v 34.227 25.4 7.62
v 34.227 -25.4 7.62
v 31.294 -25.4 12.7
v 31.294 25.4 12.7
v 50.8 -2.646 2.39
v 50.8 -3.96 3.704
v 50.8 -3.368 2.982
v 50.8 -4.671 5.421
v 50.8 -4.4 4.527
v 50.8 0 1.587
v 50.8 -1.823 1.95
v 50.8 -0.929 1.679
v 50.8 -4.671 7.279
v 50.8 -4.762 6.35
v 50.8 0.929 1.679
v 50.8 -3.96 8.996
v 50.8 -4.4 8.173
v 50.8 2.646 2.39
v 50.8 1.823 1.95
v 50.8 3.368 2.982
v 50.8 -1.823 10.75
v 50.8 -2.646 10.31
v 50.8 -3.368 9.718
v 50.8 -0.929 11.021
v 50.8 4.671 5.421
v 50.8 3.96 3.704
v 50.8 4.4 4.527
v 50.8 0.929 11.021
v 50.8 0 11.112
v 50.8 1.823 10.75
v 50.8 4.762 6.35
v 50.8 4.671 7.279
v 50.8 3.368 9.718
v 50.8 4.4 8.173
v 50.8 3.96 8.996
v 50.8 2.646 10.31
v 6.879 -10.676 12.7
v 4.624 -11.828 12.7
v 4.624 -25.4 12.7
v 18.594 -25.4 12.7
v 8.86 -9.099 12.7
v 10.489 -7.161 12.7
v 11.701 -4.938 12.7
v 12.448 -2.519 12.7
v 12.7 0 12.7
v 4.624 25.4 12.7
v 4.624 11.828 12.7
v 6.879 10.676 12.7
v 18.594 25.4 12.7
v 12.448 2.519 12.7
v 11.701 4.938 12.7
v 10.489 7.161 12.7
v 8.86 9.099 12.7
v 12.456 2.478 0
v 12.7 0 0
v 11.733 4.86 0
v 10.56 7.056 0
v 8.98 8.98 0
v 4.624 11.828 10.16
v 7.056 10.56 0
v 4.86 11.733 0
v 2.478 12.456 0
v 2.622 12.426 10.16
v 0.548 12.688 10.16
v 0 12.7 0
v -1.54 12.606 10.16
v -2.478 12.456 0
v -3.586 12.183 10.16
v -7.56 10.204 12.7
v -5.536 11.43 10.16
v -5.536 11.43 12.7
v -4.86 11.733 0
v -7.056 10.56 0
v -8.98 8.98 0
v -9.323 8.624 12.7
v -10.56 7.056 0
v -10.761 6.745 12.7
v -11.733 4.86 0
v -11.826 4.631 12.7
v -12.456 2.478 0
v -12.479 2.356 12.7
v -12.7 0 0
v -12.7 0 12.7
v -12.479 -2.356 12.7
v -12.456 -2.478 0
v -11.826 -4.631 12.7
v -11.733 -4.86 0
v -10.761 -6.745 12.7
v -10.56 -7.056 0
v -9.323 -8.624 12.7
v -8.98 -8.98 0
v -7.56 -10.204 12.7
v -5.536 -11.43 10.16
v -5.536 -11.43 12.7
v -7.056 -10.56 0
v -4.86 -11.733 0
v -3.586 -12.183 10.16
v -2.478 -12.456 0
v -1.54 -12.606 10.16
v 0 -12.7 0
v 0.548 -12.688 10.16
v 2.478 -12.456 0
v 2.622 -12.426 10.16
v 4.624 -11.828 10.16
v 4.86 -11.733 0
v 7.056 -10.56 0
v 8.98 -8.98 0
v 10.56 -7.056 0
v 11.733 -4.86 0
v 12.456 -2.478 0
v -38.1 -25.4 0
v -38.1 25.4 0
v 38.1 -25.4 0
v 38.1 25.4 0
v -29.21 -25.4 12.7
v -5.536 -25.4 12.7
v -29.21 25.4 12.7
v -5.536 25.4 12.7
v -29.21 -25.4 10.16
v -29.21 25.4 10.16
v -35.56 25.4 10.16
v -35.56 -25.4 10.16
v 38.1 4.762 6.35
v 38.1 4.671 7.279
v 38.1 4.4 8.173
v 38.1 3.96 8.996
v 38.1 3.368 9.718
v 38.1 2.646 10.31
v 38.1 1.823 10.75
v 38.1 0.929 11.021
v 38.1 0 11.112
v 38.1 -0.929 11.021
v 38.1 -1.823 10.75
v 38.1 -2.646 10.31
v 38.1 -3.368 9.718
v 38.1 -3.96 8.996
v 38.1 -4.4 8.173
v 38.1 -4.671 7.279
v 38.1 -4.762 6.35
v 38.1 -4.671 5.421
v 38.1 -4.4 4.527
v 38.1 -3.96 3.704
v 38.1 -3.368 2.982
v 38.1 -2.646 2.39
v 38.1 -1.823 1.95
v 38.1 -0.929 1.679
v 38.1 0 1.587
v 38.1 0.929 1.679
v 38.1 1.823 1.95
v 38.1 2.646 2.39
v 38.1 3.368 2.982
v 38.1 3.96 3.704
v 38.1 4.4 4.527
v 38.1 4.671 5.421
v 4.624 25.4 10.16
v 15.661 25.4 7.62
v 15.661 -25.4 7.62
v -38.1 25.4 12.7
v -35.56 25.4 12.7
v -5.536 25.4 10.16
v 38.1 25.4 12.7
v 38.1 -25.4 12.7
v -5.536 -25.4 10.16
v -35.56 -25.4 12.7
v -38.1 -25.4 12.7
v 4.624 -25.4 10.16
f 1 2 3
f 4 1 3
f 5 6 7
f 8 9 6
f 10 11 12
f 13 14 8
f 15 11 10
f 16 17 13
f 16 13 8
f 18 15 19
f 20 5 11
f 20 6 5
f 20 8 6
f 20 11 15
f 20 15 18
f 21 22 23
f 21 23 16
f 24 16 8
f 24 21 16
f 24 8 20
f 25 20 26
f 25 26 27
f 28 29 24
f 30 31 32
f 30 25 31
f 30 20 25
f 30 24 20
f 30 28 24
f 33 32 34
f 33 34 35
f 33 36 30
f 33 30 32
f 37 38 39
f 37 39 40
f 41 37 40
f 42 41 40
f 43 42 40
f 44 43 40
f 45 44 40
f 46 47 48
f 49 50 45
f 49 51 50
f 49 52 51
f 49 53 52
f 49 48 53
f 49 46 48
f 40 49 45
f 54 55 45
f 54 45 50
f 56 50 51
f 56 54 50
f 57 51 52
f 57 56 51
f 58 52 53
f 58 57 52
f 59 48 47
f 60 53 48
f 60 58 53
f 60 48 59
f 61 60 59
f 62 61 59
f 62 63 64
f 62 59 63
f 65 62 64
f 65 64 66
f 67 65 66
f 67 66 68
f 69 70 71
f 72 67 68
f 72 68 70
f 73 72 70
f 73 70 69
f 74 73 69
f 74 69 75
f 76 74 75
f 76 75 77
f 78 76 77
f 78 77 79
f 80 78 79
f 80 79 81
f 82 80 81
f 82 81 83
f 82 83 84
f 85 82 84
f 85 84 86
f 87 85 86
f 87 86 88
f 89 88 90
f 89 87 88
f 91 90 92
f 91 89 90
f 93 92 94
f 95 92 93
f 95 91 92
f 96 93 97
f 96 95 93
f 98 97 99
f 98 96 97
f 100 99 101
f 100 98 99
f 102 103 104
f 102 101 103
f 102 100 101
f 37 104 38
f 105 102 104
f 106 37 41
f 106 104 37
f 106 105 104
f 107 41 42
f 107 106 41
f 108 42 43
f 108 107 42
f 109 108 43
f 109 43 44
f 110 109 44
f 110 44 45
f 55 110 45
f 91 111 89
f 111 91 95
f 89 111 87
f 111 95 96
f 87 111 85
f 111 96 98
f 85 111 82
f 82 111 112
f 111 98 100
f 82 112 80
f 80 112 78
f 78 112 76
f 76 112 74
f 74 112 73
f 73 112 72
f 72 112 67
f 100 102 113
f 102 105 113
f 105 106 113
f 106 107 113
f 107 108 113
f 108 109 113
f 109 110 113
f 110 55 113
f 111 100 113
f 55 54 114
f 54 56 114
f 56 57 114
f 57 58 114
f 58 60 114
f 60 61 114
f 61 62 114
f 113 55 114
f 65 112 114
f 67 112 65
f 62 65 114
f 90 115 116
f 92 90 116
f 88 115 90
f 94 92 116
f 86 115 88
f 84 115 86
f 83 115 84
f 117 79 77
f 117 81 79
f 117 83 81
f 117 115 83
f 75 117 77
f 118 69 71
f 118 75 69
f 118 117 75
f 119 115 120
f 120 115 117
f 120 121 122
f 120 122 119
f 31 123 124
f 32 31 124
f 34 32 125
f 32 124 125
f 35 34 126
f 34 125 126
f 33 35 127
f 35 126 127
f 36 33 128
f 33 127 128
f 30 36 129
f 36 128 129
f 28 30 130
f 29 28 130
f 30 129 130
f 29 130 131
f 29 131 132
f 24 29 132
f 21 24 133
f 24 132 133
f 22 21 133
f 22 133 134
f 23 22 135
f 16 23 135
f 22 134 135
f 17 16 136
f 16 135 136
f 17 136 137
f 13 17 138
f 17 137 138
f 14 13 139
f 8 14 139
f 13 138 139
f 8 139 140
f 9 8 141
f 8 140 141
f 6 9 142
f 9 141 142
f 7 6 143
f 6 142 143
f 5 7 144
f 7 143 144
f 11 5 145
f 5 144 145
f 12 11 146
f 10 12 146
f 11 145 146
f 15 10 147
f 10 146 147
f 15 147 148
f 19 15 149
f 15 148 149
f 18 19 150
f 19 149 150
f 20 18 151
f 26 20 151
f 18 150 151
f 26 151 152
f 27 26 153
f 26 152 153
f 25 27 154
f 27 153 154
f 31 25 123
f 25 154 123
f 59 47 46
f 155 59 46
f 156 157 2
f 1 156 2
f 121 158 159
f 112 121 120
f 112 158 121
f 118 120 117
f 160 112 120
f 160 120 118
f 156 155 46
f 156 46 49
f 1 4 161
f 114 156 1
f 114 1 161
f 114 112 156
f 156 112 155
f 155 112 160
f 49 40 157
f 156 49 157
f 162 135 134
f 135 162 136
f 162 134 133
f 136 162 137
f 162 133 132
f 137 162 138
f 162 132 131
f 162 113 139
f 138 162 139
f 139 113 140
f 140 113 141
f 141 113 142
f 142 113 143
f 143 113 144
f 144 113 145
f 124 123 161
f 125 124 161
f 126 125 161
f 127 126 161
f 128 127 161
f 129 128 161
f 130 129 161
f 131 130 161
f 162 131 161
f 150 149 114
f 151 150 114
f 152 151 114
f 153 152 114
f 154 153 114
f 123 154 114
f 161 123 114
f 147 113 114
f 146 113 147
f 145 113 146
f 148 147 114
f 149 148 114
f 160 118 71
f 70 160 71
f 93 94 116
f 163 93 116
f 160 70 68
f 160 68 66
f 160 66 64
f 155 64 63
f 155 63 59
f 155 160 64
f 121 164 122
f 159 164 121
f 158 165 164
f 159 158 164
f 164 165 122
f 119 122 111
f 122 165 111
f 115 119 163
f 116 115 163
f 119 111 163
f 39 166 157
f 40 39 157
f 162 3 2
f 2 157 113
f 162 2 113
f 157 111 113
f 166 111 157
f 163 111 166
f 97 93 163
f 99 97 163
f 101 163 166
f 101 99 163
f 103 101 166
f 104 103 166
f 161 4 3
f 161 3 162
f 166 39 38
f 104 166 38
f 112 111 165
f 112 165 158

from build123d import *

# Parameters (mm, degrees)
F0_W     = 76.2
F0_H     = 50.8
F0_R     = 12.7
F1_DEPTH = 12.7
F2_W     = 6.35
F2_H     = 50.8
F3_DEPTH = 2.54
F5_DEPTH = 50.801
F6_R     = 4.7625
F7_DEPTH = 12.7


with BuildPart() as f1:
    # F0 (on Top) → F1 (new body)
    with BuildSketch(Plane.XY):
        Rectangle(F0_W, F0_H)
        Circle(F0_R, mode=Mode.SUBTRACT)
    extrude(amount=F1_DEPTH)

    # F2 (on face) → F3 (cut)
    with BuildSketch(Plane.XY.offset(12.7)):
        with BuildLine():
            ThreePointArc((4.624233052, 11.8282064862), (-0.4973552707, 12.6902575913), (-5.535766948, 11.4300168109))
            Line((-5.535766948, 11.4300168109), (-5.535766948, -11.4300168109))
            ThreePointArc((-5.535766948, -11.4300168109), (-0.4973552707, -12.6902575913), (4.624233052, -11.8282064862))
            Line((4.624233052, -11.8282064862), (4.624233052, 11.8282064862))
        make_face()
        with Locations((-32.385, 0)):
            Rectangle(F2_W, F2_H)
        with BuildLine():
            Line((-5.535766948, -11.4300168109), (-5.535766948, -25.4))
            Line((-5.535766948, -25.4), (4.624233052, -25.4))
            Line((4.624233052, -25.4), (4.624233052, -11.8282064862))
            ThreePointArc((4.624233052, -11.8282064862), (-0.4973552707, -12.6902575913), (-5.535766948, -11.4300168109))
        make_face()
        with BuildLine():
            Line((4.624233052, 25.4), (-5.535766948, 25.4))
            Line((-5.535766948, 25.4), (-5.535766948, 11.4300168109))
            ThreePointArc((-5.535766948, 11.4300168109), (-0.4973552707, 12.6902575913), (4.624233052, 11.8282064862))
            Line((4.624233052, 11.8282064862), (4.624233052, 25.4))
        make_face()
    extrude(amount=-F3_DEPTH, mode=Mode.SUBTRACT)

    # F4 (on face) → F5 (cut, through all)
    with BuildSketch(Plane.XZ.offset(25.4)):
        Polygon((31.294233052, 12.7), (18.594233052, 12.7), (15.6612936845, 7.62), (34.2271724195, 7.62), align=None)
    extrude(amount=-F5_DEPTH, mode=Mode.SUBTRACT)

    # F6 (on face) → F7 (join)
    with BuildSketch(Plane.YZ.offset(38.1)):
        with Locations((0, 6.35)):
            Circle(F6_R)
    extrude(amount=F7_DEPTH)


solid = f1.part
